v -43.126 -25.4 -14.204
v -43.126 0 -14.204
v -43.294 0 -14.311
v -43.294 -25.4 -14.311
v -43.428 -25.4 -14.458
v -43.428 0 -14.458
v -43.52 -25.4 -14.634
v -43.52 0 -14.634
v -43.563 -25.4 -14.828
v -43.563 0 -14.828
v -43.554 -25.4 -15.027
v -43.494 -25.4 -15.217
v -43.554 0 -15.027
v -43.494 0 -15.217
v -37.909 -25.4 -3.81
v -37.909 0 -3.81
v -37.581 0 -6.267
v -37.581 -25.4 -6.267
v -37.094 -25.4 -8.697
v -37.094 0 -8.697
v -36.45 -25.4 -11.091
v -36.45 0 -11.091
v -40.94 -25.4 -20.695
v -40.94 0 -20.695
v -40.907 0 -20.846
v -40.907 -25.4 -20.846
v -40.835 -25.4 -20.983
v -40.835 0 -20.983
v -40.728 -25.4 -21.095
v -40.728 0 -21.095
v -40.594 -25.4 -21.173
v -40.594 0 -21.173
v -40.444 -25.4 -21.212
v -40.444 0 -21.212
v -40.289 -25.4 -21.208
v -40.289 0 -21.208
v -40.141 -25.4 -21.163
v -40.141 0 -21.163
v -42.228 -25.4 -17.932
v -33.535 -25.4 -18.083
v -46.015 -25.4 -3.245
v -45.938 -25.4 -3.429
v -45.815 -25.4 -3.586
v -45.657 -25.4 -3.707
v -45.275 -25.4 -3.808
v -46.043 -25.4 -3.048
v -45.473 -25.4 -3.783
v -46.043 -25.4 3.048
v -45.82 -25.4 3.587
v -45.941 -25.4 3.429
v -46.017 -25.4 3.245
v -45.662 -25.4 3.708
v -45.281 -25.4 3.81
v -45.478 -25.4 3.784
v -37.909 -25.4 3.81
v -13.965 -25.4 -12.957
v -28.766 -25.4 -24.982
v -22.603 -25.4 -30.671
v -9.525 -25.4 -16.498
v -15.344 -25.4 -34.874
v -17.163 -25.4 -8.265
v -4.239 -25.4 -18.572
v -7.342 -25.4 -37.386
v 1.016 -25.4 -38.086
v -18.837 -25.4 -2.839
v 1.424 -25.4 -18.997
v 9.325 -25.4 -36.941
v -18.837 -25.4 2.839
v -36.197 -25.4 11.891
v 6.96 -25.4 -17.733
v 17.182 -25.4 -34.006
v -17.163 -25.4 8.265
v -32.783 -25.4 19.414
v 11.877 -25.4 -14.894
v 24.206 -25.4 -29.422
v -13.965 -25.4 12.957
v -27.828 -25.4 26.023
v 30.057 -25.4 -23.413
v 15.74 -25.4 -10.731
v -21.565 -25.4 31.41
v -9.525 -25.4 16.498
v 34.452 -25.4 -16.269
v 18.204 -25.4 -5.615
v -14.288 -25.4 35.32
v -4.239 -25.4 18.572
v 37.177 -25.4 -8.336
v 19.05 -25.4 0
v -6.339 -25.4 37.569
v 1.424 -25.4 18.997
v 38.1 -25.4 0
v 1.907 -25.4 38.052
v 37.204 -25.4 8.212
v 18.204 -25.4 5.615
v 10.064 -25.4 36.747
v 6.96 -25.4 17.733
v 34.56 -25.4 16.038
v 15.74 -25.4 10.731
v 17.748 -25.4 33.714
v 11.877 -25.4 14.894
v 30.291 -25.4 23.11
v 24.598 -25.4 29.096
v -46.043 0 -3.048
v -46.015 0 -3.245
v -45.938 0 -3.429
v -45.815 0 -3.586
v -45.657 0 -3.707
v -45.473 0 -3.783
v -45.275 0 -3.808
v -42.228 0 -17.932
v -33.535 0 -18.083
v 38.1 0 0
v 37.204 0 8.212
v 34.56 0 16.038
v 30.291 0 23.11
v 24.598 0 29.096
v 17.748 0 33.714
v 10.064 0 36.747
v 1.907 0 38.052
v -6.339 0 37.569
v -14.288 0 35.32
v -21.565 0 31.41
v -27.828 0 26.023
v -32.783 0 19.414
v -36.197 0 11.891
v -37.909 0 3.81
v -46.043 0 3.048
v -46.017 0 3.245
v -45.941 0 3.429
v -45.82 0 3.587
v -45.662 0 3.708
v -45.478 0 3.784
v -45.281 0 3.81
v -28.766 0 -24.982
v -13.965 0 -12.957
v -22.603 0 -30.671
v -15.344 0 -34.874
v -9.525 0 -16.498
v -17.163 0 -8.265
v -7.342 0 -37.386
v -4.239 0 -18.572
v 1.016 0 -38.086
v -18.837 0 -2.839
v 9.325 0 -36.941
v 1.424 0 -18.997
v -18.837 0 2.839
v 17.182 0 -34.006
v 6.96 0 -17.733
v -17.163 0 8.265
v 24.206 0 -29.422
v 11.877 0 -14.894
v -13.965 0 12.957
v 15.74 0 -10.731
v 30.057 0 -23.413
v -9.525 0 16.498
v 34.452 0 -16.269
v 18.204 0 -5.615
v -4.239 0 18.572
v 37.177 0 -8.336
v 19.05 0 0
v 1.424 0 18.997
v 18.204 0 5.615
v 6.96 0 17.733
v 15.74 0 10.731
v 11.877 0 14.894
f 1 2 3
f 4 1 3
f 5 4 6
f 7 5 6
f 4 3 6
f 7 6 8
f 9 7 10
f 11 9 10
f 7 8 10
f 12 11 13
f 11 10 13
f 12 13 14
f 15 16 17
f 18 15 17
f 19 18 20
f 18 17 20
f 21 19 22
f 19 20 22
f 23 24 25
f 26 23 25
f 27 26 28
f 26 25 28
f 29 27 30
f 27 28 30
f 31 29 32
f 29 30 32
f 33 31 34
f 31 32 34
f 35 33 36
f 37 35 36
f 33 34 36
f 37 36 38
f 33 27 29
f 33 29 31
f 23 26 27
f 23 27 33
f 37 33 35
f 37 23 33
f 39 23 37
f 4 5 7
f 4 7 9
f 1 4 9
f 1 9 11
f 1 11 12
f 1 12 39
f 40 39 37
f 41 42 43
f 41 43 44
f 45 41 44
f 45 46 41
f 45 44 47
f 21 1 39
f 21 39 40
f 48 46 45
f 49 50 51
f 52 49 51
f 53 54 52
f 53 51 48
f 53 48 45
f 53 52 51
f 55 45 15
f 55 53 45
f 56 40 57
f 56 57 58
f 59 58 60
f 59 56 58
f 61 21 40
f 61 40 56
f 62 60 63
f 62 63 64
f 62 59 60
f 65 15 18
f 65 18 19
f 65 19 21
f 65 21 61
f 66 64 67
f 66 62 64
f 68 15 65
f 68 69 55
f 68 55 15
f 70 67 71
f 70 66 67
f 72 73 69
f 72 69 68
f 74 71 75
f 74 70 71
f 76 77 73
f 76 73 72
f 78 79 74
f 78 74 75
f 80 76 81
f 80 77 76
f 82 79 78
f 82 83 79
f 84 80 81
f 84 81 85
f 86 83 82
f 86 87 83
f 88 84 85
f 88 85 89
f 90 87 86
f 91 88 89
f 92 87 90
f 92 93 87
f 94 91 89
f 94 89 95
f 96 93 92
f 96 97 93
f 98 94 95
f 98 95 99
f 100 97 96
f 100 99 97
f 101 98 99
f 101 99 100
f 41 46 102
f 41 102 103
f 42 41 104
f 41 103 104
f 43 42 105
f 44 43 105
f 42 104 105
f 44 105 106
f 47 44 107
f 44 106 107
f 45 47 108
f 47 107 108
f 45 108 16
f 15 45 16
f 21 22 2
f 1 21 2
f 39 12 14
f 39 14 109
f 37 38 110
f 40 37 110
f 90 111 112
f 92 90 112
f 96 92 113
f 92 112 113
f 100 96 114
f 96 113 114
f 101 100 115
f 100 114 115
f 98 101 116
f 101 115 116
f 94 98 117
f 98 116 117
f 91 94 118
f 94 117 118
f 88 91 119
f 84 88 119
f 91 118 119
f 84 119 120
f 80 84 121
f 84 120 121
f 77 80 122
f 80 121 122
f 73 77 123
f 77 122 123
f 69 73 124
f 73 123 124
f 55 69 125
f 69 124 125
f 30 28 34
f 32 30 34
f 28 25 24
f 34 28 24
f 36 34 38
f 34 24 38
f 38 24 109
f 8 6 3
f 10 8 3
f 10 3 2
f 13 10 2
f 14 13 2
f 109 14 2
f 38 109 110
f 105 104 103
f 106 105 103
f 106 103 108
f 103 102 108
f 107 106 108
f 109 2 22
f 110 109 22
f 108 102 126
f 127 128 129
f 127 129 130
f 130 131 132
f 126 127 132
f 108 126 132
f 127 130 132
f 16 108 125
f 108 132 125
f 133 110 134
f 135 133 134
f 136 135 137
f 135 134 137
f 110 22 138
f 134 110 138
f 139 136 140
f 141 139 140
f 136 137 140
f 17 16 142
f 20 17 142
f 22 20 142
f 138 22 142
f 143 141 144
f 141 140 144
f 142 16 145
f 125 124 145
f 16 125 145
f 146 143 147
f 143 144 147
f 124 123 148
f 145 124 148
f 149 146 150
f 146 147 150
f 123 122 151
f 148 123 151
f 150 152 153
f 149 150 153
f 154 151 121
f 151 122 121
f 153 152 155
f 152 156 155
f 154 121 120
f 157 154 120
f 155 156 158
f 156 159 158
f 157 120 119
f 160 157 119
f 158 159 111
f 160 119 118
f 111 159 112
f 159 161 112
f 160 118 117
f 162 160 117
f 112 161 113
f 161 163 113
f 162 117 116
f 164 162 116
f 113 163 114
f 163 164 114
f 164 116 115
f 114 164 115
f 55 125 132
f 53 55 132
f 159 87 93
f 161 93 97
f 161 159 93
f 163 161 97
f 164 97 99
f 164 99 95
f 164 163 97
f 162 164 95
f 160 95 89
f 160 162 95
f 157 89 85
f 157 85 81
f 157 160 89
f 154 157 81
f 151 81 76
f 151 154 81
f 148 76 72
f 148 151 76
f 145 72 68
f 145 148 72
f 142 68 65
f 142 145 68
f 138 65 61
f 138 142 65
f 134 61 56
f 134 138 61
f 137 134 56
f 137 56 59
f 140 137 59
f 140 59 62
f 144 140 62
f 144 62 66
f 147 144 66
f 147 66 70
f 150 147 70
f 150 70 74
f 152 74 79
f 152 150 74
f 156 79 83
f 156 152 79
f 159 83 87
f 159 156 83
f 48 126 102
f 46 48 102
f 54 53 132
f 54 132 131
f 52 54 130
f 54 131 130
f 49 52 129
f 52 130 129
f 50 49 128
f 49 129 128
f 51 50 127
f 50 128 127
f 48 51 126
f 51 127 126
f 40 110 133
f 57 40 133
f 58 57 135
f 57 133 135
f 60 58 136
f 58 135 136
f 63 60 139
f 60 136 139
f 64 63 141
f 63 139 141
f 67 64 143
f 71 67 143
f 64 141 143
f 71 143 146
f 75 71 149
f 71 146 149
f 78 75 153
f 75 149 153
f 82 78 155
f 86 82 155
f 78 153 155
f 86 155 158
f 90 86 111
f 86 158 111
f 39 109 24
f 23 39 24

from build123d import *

# Parameters (mm, degrees)
F0_R     = 19.05
F1_DEPTH = 25.4


with BuildPart() as f1:
    # F0 (on Front) → F1 (new body)
    with BuildSketch(Plane.XZ):
        with BuildLine():
            ThreePointArc((-33.535455, -18.082679), (9.324944, -36.941243), (38.1, 0))
            ThreePointArc((38.1, 0), (1.907392, 38.052225), (-37.909021, 3.81))
            ThreePointArc((-37.909021, 3.81), (-38.1, 0), (-37.909021, -3.81))
            ThreePointArc((-37.909021, -3.81), (-37.357291, -7.486173), (-36.449937, -11.091082))
            ThreePointArc((-36.449937, -11.091082), (-35.166879, -14.659489), (-33.535455, -18.082679))
        make_face()
        Circle(F0_R, mode=Mode.SUBTRACT)
        with BuildLine():
            ThreePointArc((-37.909021, -3.81), (-38.1, 0), (-37.909021, 3.81))
            Line((-37.909021, 3.81), (-45.281142, 3.81))
            ThreePointArc((-45.281142, 3.81), (-45.819958, 3.586815), (-46.043142, 3.048))
            Line((-46.043142, 3.048), (-46.043142, 0))
            Line((-46.043142, 0), (-46.043142, -3.048))
            ThreePointArc((-46.043142, -3.048), (-45.815414, -3.586136), (-45.275021, -3.808454))
            Line((-45.275021, -3.808454), (-37.909021, -3.81))
        make_face()
        with BuildLine():
            Line((-40.141169, -21.162974), (-33.535455, -18.082679))
            ThreePointArc((-33.535455, -18.082679), (-35.166879, -14.659489), (-36.449937, -11.091082))
            Line((-36.449937, -11.091082), (-43.1258, -14.204088))
            ThreePointArc((-43.1258, -14.204088), (-43.519811, -14.634075), (-43.494372, -15.216729))
            Line((-43.494372, -15.216729), (-42.228101, -17.932256))
            Line((-42.228101, -17.932256), (-40.93996, -20.694683))
            ThreePointArc((-40.93996, -20.694683), (-40.663444, -21.138431), (-40.141169, -21.162974))
        make_face()
    extrude(amount=F1_DEPTH)


solid = f1.part
